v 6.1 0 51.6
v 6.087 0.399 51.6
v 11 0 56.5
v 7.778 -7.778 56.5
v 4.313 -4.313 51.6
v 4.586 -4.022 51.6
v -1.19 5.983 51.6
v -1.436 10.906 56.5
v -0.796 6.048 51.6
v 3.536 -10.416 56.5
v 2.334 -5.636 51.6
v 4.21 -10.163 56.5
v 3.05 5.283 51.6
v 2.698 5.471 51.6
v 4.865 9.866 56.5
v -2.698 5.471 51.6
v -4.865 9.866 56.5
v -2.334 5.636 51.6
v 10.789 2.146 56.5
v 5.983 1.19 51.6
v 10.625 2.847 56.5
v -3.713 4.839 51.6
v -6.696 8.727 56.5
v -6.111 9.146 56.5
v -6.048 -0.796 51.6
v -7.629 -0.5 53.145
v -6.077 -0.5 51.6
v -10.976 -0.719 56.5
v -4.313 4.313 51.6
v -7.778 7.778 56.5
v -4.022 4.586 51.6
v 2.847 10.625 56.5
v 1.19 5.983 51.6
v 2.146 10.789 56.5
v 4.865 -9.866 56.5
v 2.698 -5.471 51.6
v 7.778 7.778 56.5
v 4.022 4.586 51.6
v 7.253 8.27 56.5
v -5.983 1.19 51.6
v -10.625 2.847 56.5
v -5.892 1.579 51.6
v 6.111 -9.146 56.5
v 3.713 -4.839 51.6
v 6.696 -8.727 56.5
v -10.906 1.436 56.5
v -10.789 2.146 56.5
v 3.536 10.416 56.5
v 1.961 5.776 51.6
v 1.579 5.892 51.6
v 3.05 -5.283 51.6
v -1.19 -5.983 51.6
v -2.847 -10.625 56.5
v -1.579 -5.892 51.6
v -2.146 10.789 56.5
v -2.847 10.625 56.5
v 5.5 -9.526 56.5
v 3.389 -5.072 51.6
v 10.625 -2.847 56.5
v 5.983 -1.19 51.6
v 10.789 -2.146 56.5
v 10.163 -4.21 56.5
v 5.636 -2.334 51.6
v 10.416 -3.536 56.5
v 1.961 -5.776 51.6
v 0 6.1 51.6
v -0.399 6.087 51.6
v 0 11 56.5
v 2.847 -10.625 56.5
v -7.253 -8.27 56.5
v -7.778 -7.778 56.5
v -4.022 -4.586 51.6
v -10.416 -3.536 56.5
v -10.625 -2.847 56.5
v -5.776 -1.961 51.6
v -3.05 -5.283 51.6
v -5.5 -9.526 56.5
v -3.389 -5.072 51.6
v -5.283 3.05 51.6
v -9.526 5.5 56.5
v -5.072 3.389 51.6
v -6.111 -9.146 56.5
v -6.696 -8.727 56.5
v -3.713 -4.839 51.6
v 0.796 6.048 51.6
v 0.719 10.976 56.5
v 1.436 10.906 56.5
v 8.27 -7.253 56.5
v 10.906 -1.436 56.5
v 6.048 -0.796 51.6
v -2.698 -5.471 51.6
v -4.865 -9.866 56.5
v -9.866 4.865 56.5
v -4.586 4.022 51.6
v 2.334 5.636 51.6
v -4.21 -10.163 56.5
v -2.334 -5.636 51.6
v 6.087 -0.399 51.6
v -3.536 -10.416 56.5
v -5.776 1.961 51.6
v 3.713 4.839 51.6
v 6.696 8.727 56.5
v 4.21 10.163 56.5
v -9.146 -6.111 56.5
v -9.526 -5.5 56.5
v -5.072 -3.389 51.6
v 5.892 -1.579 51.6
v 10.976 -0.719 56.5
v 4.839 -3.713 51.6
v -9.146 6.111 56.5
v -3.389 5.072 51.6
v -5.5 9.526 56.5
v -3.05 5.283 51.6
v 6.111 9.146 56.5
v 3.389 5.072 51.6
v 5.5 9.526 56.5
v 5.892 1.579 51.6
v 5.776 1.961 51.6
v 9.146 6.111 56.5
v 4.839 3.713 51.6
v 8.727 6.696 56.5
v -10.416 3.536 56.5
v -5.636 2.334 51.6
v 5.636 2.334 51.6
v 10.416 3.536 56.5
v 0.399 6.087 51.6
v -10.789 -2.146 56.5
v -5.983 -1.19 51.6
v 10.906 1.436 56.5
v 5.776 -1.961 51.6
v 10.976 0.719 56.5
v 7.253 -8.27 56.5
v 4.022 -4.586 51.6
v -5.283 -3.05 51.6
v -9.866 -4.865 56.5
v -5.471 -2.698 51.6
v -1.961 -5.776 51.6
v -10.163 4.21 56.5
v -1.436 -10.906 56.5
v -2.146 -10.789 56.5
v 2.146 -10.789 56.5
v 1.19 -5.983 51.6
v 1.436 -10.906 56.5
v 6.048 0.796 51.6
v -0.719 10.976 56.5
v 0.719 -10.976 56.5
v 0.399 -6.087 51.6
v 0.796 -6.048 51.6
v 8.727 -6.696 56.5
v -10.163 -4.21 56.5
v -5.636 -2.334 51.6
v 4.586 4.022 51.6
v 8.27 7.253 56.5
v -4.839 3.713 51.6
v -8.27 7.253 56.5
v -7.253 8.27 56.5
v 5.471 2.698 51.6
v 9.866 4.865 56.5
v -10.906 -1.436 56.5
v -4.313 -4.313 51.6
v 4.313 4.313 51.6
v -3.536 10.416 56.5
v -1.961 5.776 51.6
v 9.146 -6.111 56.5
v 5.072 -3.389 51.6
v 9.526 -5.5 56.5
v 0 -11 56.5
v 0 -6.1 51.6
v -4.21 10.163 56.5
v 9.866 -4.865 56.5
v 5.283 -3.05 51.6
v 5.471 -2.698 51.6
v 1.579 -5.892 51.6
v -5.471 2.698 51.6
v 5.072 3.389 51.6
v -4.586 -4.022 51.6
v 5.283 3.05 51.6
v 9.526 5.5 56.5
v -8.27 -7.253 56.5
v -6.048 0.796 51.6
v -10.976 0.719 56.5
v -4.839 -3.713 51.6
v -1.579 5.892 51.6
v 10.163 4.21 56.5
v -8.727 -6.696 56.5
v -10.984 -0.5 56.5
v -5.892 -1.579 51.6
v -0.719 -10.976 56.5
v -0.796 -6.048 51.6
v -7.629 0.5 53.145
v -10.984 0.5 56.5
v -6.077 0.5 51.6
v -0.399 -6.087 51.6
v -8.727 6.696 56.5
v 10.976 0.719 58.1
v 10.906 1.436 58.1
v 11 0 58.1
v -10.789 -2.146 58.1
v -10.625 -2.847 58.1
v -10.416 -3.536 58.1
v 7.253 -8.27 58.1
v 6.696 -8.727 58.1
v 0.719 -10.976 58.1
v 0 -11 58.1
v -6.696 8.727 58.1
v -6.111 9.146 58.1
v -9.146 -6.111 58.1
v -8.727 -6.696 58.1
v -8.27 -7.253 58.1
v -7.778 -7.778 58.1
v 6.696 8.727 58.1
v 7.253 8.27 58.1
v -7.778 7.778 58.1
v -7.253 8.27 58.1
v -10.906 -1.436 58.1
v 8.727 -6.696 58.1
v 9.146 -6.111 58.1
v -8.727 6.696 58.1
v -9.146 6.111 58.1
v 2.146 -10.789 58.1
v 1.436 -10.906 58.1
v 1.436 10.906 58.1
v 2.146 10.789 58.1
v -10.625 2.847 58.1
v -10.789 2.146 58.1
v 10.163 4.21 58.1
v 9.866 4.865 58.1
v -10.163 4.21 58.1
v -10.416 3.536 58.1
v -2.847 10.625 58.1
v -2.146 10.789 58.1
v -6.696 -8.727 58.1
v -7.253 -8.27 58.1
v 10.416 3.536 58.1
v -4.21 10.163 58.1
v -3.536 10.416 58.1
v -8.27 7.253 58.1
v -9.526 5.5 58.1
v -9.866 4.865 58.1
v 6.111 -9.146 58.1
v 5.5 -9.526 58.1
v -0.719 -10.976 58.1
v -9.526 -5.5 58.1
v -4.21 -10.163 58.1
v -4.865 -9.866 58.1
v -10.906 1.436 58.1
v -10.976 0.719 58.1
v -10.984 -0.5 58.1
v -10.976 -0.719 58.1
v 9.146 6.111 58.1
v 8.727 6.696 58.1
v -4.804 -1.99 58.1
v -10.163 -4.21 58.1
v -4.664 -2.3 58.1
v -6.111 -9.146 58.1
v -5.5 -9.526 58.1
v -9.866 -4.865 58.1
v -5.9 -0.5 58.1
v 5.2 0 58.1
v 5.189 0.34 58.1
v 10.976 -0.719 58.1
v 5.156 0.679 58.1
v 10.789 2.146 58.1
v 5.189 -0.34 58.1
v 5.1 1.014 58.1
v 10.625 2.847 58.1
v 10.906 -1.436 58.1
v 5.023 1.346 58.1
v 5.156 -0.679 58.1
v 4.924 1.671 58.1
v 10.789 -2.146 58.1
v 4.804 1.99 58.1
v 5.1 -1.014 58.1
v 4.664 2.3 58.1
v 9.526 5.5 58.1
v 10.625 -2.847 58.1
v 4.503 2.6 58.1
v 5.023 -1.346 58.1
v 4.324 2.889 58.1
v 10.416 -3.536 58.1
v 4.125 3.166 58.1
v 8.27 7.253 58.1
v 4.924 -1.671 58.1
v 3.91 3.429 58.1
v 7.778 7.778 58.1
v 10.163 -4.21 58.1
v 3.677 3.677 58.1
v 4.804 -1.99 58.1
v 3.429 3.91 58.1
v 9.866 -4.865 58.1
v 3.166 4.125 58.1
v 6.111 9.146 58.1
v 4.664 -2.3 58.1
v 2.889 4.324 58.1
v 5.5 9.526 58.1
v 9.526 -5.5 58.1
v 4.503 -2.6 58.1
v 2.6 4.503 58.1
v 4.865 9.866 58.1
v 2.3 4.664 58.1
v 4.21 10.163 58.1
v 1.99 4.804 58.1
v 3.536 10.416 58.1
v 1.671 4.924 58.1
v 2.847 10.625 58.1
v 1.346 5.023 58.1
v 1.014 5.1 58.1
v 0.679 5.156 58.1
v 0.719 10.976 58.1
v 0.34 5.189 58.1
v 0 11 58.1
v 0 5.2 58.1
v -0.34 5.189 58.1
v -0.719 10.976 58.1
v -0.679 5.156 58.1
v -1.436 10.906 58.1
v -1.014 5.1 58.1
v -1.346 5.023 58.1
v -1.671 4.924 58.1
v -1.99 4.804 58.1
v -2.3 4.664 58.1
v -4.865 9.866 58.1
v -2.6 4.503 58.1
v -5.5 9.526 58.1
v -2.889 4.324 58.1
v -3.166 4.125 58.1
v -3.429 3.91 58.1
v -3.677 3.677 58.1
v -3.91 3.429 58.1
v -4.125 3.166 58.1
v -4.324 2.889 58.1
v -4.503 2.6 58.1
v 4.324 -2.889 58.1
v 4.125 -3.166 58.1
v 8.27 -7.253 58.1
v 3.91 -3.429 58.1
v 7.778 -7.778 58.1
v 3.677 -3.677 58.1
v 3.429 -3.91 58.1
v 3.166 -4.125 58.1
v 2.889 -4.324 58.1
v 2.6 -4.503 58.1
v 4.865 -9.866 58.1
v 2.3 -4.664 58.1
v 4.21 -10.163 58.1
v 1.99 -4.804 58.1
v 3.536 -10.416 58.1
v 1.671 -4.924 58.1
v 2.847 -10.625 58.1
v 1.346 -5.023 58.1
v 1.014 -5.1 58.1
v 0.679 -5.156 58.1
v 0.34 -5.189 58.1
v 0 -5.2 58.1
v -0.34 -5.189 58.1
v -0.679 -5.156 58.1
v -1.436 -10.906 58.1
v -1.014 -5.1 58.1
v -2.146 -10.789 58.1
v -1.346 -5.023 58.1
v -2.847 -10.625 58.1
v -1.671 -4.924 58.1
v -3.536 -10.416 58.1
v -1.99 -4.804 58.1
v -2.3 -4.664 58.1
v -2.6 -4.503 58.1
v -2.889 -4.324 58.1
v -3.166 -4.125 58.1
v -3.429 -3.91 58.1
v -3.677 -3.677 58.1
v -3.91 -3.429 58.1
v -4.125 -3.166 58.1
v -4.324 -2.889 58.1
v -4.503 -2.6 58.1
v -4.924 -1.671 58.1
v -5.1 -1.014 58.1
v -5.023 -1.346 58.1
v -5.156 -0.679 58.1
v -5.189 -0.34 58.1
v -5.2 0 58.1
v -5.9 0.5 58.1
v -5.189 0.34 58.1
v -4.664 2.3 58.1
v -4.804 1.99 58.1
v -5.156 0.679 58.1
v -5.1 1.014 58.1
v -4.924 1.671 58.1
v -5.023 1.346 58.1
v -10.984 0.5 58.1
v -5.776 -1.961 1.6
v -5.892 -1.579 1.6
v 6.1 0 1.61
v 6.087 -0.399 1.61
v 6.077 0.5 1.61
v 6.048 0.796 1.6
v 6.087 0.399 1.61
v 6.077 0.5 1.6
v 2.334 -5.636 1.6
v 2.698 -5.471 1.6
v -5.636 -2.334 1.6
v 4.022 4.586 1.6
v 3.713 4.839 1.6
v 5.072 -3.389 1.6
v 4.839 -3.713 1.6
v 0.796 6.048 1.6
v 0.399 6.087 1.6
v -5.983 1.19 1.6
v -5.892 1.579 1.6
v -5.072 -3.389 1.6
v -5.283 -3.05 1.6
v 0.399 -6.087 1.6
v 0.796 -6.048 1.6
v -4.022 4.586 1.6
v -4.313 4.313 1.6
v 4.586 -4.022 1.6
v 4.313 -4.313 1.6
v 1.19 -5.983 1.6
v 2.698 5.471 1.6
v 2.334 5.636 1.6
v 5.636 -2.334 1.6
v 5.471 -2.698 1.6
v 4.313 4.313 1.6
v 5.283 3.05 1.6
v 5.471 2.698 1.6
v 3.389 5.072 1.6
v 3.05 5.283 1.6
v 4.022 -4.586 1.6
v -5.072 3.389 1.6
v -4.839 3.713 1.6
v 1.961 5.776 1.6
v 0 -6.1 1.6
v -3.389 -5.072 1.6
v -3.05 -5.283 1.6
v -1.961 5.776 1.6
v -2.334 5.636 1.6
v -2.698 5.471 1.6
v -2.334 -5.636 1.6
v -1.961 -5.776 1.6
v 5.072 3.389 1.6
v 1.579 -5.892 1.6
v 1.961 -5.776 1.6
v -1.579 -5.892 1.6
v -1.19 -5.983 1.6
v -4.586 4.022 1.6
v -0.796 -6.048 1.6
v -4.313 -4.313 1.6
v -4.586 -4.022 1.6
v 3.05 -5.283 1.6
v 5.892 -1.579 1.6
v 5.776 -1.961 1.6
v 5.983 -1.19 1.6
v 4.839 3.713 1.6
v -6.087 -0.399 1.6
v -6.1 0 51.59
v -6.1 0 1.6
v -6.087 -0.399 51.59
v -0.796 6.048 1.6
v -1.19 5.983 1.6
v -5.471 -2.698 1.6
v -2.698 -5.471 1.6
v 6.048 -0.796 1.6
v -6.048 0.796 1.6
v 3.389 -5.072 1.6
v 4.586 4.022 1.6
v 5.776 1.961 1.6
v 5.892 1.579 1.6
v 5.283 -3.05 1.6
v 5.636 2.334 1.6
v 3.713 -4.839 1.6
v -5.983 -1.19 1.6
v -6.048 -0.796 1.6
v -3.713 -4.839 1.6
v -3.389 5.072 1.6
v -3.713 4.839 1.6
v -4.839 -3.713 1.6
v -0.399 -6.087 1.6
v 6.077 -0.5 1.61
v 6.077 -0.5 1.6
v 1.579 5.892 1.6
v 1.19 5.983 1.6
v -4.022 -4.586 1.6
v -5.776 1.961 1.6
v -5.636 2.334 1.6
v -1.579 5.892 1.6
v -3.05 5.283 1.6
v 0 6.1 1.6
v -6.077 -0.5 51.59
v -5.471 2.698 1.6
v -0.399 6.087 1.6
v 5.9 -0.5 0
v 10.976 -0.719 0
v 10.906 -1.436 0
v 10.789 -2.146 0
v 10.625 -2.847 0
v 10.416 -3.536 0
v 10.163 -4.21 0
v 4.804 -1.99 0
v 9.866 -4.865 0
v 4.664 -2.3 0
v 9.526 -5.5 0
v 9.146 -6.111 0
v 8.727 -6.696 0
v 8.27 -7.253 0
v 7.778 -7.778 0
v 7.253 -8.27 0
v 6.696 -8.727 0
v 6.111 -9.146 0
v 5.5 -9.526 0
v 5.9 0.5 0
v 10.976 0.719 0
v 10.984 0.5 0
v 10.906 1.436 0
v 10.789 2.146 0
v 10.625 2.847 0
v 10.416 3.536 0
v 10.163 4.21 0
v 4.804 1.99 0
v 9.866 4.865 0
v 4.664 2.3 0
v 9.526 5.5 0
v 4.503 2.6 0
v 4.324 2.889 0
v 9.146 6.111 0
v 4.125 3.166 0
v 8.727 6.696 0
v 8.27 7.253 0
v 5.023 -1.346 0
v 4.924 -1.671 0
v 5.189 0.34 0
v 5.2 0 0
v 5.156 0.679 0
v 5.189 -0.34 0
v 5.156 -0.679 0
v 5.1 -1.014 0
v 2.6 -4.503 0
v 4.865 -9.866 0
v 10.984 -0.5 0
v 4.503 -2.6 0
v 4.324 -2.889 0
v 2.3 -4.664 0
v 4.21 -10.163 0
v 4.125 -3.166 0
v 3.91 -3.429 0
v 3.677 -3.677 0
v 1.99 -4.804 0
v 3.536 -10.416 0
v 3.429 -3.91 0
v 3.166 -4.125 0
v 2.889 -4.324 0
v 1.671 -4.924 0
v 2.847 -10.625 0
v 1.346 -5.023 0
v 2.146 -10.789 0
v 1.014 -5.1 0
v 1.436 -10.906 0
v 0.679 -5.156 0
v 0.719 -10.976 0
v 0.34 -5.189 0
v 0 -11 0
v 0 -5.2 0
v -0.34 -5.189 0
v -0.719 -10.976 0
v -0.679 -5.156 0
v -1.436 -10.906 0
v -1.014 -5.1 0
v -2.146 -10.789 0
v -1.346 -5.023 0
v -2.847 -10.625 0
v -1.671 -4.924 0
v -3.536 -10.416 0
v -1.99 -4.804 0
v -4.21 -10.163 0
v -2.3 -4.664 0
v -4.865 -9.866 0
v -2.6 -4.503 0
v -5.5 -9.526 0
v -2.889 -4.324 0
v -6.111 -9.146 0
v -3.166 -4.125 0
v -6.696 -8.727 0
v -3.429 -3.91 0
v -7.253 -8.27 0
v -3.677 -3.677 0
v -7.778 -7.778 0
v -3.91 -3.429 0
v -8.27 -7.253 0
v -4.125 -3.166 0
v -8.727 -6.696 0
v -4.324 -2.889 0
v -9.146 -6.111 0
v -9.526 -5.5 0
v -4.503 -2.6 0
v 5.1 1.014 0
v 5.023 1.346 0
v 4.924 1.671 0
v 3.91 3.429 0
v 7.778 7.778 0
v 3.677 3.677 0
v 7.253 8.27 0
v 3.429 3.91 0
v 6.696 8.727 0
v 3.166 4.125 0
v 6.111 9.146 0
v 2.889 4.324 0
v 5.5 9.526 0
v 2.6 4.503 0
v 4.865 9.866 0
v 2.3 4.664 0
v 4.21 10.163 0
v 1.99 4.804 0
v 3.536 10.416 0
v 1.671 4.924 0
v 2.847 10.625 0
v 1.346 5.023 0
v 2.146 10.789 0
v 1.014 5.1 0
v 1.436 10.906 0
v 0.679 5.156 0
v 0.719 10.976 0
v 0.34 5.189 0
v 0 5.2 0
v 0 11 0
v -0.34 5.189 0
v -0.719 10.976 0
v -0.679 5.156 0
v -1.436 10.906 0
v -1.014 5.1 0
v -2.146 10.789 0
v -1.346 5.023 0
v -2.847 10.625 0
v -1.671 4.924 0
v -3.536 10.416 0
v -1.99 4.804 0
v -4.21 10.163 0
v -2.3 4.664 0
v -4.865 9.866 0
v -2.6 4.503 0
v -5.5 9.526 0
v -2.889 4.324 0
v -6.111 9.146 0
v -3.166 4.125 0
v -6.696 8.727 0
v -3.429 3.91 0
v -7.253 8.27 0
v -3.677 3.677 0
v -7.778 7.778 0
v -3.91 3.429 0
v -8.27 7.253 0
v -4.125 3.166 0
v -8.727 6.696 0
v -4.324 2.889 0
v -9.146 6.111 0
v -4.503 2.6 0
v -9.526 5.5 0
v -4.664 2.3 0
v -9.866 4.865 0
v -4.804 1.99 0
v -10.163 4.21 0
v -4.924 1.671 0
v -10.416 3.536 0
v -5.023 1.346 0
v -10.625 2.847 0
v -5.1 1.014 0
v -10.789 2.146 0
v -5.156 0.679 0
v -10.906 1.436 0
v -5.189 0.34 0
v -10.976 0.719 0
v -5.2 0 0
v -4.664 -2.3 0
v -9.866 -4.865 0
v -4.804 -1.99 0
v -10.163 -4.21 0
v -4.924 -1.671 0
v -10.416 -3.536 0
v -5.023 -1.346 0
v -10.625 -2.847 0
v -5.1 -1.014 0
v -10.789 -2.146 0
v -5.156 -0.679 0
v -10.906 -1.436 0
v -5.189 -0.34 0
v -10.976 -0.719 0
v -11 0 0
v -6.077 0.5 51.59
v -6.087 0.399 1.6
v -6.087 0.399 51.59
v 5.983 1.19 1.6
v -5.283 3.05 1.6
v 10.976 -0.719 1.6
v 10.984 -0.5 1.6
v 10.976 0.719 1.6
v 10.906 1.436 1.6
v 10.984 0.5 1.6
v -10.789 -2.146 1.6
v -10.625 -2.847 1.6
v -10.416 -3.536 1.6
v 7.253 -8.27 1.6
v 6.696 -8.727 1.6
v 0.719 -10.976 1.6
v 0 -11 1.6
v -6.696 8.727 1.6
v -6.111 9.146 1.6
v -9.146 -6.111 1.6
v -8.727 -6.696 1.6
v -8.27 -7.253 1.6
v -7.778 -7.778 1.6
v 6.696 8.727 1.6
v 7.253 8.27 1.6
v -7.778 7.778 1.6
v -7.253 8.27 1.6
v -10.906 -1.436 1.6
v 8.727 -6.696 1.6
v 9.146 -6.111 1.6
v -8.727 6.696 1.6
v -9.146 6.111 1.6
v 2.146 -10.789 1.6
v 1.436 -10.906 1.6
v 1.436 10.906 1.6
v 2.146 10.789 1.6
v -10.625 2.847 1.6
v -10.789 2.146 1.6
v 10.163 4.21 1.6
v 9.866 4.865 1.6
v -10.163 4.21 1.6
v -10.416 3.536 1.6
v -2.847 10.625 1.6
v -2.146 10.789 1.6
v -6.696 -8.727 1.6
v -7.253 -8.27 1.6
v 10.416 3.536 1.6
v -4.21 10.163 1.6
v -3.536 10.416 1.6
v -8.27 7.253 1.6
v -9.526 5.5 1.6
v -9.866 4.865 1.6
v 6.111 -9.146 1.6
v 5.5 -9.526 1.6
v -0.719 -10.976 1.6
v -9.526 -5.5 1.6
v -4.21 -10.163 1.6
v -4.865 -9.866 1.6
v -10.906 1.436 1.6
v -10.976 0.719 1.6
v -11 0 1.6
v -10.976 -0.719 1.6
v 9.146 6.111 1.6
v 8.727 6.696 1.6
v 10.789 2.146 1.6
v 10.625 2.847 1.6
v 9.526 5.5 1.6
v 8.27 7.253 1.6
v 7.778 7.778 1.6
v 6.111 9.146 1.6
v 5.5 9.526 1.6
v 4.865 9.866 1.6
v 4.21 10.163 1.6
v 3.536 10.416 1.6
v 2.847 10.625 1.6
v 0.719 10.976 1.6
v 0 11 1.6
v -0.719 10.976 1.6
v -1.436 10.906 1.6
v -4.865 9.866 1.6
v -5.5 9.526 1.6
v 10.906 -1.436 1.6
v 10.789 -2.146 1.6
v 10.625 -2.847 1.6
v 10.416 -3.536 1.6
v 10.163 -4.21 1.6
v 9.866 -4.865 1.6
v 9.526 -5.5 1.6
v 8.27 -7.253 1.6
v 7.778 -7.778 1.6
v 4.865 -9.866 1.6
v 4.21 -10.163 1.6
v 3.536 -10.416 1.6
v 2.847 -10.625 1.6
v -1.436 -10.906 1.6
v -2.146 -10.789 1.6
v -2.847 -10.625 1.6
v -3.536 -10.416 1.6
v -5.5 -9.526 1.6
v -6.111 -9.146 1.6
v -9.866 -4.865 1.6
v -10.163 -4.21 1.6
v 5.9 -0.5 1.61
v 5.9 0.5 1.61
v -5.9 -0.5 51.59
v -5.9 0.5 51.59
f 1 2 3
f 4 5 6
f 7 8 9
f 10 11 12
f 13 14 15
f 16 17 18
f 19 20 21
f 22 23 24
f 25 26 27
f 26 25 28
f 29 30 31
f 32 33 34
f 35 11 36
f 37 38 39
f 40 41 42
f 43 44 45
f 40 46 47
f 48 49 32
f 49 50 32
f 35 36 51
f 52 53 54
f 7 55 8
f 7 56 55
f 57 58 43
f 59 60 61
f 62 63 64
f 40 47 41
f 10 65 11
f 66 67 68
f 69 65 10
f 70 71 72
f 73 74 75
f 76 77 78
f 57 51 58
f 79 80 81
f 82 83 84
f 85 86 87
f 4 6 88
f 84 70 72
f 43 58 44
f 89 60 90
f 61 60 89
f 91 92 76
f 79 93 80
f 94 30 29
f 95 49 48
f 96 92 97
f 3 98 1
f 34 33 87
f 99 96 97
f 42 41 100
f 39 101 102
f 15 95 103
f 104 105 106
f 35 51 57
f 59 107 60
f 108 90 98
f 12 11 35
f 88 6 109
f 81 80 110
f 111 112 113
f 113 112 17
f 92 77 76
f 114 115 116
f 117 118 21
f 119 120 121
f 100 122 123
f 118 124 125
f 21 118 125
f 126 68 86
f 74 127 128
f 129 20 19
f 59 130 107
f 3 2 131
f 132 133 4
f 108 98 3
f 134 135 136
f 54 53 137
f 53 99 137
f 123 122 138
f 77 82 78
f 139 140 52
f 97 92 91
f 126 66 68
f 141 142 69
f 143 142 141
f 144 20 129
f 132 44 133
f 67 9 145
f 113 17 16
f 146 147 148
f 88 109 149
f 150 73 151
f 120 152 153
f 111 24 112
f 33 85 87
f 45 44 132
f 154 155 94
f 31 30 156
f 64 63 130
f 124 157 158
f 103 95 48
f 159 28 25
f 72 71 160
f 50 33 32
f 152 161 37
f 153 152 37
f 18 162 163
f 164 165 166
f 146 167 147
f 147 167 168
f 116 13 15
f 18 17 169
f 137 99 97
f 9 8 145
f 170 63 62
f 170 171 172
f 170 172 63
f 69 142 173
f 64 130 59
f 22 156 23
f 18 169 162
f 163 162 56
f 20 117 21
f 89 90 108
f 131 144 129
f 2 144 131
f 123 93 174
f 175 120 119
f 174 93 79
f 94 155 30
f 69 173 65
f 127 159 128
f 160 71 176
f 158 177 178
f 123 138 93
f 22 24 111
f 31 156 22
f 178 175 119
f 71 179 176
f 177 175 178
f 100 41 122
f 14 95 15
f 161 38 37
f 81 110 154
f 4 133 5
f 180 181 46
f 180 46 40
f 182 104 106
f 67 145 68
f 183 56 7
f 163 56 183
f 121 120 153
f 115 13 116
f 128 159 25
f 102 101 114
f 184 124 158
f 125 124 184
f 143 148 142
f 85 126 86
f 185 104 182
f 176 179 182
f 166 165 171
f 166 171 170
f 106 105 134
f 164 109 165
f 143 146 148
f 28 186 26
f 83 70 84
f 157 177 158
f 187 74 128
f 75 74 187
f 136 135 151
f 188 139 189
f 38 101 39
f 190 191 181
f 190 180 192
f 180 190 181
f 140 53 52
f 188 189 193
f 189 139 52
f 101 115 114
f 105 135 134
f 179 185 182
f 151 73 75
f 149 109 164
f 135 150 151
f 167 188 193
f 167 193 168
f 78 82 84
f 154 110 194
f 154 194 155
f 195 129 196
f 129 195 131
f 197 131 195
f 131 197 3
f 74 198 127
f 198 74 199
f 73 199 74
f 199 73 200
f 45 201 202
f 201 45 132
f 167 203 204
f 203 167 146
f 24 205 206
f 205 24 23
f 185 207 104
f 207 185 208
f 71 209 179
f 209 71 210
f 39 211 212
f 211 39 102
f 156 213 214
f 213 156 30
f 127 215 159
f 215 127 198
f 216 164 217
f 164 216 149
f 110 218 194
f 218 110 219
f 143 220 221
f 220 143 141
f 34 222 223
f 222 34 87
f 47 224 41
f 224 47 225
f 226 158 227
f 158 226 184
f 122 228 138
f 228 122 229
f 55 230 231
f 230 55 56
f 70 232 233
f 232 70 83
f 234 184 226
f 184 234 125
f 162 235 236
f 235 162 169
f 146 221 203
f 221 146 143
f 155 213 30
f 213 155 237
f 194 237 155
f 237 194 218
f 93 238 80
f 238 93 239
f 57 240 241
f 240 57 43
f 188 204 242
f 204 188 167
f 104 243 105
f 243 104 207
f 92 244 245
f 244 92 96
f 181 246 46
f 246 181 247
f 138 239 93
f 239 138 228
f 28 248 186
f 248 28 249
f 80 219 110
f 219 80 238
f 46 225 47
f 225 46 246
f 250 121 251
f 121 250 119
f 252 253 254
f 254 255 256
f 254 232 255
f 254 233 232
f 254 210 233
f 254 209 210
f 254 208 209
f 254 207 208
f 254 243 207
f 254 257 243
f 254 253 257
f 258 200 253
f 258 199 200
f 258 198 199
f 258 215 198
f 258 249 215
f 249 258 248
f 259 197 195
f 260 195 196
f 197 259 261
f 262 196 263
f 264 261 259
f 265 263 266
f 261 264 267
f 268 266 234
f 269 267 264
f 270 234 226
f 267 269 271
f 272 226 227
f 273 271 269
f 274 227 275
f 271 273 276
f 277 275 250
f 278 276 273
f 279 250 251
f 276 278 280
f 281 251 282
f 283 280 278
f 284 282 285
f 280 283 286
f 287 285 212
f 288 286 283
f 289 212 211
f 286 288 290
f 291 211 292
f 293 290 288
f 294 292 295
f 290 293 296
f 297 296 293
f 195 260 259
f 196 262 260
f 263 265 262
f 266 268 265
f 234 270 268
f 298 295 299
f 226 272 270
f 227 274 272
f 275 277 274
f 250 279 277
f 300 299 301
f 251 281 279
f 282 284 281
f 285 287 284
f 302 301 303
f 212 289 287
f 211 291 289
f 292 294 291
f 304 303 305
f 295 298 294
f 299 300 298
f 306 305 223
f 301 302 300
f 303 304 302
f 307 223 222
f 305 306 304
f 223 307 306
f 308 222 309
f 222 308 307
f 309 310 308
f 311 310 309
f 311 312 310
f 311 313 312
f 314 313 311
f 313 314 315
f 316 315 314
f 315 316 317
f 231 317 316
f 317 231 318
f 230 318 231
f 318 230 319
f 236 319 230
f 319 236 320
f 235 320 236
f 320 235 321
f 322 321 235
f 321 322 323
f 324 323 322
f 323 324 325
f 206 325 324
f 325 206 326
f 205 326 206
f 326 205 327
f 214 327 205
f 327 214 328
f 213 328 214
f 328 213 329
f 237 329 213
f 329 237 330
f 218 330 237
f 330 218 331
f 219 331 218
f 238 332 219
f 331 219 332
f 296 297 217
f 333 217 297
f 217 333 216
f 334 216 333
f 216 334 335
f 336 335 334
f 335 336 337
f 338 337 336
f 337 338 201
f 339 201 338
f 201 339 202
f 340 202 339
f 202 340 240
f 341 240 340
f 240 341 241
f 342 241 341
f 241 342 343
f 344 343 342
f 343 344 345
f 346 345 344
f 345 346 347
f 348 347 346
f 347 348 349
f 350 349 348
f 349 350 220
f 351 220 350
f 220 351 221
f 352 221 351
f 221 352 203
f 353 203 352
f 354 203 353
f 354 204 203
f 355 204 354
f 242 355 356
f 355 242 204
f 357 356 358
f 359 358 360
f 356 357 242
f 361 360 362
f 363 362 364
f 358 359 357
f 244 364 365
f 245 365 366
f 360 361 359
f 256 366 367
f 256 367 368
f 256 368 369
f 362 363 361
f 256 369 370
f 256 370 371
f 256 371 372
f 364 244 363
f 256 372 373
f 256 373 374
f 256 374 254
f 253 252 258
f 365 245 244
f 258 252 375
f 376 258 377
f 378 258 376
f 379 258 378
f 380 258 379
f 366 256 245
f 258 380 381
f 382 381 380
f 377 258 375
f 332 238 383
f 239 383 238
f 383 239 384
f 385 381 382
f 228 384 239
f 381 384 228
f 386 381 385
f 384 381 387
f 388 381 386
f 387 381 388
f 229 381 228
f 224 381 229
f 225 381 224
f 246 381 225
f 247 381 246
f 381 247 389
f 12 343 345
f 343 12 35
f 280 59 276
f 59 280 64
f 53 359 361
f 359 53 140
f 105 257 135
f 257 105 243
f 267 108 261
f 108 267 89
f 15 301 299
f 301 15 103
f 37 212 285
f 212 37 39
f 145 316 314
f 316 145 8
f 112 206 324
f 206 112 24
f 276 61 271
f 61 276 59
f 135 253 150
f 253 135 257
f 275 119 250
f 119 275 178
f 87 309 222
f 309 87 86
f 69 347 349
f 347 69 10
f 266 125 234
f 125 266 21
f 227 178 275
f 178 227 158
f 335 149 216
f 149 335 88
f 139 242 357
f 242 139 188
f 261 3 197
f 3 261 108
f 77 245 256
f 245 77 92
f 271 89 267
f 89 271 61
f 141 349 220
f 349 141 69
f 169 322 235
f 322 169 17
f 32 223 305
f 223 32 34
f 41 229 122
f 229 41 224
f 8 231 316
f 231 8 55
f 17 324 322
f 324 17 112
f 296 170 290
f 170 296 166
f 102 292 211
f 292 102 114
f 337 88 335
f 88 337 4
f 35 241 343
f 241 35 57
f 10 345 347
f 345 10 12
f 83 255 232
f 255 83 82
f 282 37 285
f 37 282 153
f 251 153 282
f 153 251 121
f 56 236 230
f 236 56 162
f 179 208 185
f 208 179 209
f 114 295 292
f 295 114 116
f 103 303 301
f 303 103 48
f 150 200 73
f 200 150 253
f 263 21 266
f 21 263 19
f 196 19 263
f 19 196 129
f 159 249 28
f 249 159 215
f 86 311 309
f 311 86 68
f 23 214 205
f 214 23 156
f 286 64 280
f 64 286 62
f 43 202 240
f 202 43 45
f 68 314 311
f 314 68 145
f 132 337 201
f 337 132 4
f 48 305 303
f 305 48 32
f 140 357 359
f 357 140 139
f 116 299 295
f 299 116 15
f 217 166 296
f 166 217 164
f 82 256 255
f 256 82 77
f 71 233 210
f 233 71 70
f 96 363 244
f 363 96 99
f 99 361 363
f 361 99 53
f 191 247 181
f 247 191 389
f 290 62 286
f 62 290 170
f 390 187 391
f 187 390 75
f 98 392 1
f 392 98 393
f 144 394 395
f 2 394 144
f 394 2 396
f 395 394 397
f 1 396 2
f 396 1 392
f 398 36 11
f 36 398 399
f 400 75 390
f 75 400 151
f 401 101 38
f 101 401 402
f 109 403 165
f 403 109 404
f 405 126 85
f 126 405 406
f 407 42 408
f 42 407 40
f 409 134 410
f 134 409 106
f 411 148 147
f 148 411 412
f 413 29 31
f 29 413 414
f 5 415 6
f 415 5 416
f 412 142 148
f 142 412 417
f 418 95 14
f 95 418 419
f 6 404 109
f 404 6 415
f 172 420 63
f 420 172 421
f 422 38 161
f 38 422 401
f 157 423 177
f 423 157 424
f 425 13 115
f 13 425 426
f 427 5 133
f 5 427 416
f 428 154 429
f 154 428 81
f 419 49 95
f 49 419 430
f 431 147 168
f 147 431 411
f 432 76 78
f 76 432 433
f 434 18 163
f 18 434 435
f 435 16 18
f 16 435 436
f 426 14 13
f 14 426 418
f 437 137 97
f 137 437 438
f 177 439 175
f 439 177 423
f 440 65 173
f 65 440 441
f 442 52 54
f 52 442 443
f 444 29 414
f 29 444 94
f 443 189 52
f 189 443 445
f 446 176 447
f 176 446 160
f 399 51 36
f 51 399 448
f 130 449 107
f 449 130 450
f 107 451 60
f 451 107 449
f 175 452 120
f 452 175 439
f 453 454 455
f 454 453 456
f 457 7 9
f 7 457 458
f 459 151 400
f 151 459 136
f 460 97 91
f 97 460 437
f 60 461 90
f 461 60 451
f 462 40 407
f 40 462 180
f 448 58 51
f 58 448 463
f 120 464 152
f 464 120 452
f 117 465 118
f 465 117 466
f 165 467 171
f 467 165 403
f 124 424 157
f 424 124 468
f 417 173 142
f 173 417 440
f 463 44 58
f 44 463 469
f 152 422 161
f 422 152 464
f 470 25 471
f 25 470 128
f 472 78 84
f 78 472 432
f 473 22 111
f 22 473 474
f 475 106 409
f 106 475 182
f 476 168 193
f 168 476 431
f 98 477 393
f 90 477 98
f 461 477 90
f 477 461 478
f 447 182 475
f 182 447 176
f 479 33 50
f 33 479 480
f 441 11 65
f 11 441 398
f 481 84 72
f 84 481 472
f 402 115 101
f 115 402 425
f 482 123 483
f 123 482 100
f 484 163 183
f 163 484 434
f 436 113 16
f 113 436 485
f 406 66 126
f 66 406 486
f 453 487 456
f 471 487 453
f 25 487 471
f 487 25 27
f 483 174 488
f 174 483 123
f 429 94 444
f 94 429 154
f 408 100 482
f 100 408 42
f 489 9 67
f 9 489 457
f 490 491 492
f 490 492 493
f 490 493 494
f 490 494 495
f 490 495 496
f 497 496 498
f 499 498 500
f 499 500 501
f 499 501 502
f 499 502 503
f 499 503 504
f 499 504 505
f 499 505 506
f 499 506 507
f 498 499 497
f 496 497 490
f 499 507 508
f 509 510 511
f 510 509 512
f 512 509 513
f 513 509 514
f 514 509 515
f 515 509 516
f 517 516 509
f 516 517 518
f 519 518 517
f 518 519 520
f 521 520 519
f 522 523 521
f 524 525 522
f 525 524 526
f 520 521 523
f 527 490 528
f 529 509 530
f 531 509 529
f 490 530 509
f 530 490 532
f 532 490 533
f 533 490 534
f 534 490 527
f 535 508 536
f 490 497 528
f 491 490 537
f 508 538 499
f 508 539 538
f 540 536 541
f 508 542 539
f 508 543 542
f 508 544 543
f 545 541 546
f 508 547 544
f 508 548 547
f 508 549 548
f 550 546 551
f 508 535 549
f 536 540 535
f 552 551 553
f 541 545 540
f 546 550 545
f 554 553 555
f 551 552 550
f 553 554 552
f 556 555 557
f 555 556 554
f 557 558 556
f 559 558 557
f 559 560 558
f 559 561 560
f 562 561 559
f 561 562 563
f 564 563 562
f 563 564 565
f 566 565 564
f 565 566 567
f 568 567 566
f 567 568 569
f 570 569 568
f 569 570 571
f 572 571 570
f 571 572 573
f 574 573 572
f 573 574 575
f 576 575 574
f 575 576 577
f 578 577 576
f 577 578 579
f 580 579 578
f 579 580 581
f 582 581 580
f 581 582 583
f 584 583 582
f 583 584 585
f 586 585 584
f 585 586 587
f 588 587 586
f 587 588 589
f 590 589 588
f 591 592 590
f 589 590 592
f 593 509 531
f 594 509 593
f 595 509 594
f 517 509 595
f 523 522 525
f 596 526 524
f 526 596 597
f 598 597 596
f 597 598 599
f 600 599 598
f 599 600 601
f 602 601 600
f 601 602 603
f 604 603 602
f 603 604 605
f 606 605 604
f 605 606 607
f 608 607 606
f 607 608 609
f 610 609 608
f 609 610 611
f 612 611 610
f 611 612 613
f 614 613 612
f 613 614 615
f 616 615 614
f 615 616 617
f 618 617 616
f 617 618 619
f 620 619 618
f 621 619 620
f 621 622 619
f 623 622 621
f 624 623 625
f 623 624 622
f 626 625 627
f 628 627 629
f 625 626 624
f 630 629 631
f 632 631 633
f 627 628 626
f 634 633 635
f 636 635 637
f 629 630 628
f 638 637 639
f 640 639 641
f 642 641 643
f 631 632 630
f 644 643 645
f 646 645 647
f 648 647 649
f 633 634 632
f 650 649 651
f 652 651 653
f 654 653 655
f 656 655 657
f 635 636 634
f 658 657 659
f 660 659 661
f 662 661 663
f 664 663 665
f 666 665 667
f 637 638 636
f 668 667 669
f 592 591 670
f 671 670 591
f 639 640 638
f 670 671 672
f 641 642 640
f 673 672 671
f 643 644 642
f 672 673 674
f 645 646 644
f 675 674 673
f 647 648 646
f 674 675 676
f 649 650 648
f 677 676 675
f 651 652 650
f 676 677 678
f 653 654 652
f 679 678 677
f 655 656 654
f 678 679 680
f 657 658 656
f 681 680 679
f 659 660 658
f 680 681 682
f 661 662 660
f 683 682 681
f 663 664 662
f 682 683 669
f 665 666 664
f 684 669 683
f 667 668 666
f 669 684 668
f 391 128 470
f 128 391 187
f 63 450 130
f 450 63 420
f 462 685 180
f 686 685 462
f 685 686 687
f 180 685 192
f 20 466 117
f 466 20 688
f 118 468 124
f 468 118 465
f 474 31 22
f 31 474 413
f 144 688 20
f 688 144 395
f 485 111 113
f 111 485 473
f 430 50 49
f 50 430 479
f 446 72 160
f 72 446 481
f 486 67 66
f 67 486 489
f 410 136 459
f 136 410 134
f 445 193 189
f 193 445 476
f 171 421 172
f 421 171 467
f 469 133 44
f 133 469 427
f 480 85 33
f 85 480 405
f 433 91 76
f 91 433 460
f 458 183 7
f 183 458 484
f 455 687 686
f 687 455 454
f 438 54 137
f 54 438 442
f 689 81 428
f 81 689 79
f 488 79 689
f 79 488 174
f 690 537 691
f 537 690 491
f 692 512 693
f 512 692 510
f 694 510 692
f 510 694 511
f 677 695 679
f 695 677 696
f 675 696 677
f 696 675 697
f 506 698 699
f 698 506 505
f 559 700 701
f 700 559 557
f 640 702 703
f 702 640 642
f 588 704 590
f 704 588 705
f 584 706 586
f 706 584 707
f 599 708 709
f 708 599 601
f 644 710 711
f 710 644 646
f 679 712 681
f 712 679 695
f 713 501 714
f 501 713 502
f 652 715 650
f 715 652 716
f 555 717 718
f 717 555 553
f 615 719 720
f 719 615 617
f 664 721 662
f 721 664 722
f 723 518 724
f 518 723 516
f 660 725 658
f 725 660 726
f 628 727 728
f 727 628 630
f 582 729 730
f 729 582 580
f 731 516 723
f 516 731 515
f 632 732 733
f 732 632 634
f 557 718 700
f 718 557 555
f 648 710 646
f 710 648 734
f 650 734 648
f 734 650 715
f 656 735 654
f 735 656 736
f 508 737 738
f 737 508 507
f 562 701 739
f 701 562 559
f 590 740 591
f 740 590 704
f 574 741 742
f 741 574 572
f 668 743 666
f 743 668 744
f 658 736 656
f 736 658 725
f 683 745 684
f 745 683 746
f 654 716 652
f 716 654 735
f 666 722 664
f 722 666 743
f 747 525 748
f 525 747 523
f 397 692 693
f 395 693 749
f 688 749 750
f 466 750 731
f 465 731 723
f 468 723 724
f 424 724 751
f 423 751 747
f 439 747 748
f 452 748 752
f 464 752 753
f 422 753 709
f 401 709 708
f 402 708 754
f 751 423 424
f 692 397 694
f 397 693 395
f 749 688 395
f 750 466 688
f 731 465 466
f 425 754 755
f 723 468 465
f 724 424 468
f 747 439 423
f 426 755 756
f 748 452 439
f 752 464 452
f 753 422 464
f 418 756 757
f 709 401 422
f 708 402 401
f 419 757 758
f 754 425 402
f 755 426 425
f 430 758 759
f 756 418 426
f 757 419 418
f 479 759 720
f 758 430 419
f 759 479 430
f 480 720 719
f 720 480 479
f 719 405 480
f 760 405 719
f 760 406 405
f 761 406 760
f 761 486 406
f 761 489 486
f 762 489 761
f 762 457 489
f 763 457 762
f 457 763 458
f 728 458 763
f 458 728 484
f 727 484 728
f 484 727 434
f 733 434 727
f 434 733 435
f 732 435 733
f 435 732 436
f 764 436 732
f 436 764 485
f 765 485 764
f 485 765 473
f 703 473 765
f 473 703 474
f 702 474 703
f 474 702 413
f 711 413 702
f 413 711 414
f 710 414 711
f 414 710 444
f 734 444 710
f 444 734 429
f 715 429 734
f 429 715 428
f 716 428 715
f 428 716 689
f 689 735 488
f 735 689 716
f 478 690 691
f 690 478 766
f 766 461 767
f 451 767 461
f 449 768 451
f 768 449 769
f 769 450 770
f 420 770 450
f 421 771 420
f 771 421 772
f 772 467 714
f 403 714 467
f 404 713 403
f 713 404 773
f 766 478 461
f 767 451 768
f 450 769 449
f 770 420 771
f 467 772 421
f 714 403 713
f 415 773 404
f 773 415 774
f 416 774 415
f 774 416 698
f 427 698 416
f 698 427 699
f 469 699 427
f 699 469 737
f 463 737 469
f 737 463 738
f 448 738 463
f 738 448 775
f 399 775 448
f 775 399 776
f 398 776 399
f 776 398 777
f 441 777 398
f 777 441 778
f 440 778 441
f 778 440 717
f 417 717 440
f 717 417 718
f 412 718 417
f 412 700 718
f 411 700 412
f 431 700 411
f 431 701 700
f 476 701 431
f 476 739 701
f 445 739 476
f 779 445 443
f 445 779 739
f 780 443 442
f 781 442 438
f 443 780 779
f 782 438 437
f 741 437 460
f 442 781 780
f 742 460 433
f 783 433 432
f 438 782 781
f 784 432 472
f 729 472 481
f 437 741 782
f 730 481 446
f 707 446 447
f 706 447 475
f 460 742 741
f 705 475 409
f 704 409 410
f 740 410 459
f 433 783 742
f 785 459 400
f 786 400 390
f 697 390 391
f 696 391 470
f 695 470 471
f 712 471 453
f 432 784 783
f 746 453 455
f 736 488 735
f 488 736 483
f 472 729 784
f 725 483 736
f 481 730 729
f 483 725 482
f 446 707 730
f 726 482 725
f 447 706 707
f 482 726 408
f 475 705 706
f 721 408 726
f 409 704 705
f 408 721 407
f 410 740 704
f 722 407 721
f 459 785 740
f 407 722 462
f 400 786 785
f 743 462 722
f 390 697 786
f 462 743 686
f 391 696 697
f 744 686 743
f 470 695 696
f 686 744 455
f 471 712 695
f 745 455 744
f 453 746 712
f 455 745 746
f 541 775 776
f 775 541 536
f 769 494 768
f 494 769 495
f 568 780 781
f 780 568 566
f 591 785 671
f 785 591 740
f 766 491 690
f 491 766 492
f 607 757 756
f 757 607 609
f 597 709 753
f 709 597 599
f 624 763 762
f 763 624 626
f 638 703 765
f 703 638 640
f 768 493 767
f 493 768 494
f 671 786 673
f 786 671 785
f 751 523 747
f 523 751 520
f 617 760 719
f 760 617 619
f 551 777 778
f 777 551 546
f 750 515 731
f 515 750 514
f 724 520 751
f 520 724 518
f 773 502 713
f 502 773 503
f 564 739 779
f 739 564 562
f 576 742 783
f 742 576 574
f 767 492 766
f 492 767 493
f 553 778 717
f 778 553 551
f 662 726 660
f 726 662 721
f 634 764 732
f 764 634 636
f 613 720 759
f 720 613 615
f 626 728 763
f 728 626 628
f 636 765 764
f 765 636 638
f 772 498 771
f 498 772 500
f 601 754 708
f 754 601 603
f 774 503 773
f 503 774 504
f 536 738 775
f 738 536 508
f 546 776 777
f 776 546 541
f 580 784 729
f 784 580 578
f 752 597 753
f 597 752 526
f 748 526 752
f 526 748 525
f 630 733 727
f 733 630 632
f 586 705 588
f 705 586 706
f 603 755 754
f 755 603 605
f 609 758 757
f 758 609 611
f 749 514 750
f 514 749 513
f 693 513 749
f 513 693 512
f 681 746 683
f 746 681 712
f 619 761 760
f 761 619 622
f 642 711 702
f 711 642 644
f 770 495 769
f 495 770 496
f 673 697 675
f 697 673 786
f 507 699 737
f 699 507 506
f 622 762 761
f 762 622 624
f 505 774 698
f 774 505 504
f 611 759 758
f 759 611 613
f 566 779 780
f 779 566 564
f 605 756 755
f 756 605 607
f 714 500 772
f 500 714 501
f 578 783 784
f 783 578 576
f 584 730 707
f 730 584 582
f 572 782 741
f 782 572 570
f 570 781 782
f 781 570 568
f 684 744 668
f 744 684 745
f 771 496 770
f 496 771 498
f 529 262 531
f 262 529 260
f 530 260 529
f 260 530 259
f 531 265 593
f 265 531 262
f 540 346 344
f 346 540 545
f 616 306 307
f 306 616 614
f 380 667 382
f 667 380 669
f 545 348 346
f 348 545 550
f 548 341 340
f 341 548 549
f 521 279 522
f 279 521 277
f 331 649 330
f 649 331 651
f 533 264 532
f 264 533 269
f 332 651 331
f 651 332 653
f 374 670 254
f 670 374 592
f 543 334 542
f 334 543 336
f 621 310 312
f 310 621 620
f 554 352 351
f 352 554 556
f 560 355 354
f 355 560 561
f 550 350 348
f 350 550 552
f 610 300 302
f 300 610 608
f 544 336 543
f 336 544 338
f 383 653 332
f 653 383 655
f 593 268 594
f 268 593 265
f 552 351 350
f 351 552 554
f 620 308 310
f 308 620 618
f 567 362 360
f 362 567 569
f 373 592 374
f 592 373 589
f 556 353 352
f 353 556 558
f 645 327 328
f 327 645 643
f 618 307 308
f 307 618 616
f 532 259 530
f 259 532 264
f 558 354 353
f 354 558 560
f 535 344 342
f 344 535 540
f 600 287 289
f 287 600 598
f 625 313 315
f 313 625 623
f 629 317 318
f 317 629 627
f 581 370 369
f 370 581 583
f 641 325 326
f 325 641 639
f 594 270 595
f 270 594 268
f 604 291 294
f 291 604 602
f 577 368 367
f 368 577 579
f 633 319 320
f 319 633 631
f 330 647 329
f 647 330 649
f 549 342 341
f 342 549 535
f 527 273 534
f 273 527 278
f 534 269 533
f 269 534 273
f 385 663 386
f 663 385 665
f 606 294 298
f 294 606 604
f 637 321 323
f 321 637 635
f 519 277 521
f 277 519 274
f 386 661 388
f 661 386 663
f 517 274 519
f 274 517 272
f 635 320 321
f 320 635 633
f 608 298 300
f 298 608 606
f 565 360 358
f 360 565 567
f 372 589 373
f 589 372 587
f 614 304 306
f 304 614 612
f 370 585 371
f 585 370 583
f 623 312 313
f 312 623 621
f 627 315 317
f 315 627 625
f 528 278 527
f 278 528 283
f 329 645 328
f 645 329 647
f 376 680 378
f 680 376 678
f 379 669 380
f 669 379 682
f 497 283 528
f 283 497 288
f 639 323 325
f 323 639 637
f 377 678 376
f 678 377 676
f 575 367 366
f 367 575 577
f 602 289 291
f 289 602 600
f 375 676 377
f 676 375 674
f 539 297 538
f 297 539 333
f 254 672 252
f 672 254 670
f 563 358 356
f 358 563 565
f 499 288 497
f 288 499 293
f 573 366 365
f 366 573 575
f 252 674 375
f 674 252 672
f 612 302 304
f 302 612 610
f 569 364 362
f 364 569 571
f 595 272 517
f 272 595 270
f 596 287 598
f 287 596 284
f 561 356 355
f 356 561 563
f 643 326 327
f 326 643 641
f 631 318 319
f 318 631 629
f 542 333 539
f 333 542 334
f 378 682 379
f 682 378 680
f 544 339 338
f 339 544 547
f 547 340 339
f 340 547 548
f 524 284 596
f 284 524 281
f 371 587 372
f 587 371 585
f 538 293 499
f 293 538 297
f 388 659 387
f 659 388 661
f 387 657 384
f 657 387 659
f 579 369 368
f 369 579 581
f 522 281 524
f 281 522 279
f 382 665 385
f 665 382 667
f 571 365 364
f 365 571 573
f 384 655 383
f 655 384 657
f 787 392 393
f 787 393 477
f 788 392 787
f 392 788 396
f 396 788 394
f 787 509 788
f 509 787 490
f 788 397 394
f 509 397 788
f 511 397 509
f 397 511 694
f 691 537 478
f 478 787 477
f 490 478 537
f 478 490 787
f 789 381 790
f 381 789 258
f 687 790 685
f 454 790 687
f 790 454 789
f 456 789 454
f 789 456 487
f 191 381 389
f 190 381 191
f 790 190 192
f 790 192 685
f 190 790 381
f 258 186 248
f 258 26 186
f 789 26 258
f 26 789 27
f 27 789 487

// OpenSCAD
// =============================================================================
// Spulenkörper für die Ferritstab-Spulen des Kabelsuchgeräts (parametrisch)
// -----------------------------------------------------------------------------
// Druck: PETG, Düse 0,4 mm, Schichthöhe 0,2 mm, 3 Wandlinien, stehend drucken
// (unterer Flansch auf dem Druckbett). Kein Stützmaterial nötig: der obere
// Flansch hat unten eine 45°-Schräge.
//
// STL erzeugen (Beispiel):
//   openscad -o spulenkoerper_H.stl -D 'wickel_l=50' -D 'flansch_d=22' spulenkoerper.scad
//   openscad -o spulenkoerper_V.stl -D 'wickel_l=36' -D 'flansch_d=15.5' spulenkoerper.scad
// =============================================================================

stab_d    = 10.0;   // Durchmesser des Ferritstabs (mm)
spiel     = 0.4;    // Spiel im Durchmesser, damit der Stab ohne Gewalt hineingeht
wand      = 0.9;    // Wandstärke des Rohrs
wickel_l  = 50;     // Länge der Wicklung zwischen den Flanschen
flansch_d = 22;     // Flanschdurchmesser (V-Spule: 15,5, passt in M20-Isolierrohr)
flansch_t = 1.6;    // Flanschdicke
schlitz_b = 1.0;    // Breite des Drahtschlitzes im Flansch

$fn = 96;

innen_d = stab_d + spiel;
aussen_d = innen_d + 2 * wand;
konus_h = (flansch_d - aussen_d) / 2;          // 45°-Schräge unter dem oberen Flansch
gesamt_h = flansch_t + wickel_l + konus_h + flansch_t;

module koerper() {
  // Rohr
  cylinder(h = gesamt_h, d = aussen_d);
  // unterer Flansch (liegt auf dem Druckbett)
  cylinder(h = flansch_t, d = flansch_d);
  // oberer Flansch mit 45°-Schräge darunter
  translate([0, 0, flansch_t + wickel_l]) {
    cylinder(h = konus_h, d1 = aussen_d, d2 = flansch_d);
    translate([0, 0, konus_h]) cylinder(h = flansch_t, d = flansch_d);
  }
}

difference() {
  koerper();
  // Bohrung für den Ferritstab
  translate([0, 0, -1]) cylinder(h = gesamt_h + 2, d = innen_d);
  // Drahtschlitz unten (Wicklungsanfang)
  translate([aussen_d / 2 - 0.2, -schlitz_b / 2, -1]) cube([flansch_d, schlitz_b, flansch_t + 1.01]);
  // Drahtschlitz oben (Wicklungsende), gegenüber
  translate([-flansch_d - aussen_d / 2 + 0.2, -schlitz_b / 2, flansch_t + wickel_l - 0.01])
    cube([flansch_d, schlitz_b, konus_h + flansch_t + 1.02]);
}
